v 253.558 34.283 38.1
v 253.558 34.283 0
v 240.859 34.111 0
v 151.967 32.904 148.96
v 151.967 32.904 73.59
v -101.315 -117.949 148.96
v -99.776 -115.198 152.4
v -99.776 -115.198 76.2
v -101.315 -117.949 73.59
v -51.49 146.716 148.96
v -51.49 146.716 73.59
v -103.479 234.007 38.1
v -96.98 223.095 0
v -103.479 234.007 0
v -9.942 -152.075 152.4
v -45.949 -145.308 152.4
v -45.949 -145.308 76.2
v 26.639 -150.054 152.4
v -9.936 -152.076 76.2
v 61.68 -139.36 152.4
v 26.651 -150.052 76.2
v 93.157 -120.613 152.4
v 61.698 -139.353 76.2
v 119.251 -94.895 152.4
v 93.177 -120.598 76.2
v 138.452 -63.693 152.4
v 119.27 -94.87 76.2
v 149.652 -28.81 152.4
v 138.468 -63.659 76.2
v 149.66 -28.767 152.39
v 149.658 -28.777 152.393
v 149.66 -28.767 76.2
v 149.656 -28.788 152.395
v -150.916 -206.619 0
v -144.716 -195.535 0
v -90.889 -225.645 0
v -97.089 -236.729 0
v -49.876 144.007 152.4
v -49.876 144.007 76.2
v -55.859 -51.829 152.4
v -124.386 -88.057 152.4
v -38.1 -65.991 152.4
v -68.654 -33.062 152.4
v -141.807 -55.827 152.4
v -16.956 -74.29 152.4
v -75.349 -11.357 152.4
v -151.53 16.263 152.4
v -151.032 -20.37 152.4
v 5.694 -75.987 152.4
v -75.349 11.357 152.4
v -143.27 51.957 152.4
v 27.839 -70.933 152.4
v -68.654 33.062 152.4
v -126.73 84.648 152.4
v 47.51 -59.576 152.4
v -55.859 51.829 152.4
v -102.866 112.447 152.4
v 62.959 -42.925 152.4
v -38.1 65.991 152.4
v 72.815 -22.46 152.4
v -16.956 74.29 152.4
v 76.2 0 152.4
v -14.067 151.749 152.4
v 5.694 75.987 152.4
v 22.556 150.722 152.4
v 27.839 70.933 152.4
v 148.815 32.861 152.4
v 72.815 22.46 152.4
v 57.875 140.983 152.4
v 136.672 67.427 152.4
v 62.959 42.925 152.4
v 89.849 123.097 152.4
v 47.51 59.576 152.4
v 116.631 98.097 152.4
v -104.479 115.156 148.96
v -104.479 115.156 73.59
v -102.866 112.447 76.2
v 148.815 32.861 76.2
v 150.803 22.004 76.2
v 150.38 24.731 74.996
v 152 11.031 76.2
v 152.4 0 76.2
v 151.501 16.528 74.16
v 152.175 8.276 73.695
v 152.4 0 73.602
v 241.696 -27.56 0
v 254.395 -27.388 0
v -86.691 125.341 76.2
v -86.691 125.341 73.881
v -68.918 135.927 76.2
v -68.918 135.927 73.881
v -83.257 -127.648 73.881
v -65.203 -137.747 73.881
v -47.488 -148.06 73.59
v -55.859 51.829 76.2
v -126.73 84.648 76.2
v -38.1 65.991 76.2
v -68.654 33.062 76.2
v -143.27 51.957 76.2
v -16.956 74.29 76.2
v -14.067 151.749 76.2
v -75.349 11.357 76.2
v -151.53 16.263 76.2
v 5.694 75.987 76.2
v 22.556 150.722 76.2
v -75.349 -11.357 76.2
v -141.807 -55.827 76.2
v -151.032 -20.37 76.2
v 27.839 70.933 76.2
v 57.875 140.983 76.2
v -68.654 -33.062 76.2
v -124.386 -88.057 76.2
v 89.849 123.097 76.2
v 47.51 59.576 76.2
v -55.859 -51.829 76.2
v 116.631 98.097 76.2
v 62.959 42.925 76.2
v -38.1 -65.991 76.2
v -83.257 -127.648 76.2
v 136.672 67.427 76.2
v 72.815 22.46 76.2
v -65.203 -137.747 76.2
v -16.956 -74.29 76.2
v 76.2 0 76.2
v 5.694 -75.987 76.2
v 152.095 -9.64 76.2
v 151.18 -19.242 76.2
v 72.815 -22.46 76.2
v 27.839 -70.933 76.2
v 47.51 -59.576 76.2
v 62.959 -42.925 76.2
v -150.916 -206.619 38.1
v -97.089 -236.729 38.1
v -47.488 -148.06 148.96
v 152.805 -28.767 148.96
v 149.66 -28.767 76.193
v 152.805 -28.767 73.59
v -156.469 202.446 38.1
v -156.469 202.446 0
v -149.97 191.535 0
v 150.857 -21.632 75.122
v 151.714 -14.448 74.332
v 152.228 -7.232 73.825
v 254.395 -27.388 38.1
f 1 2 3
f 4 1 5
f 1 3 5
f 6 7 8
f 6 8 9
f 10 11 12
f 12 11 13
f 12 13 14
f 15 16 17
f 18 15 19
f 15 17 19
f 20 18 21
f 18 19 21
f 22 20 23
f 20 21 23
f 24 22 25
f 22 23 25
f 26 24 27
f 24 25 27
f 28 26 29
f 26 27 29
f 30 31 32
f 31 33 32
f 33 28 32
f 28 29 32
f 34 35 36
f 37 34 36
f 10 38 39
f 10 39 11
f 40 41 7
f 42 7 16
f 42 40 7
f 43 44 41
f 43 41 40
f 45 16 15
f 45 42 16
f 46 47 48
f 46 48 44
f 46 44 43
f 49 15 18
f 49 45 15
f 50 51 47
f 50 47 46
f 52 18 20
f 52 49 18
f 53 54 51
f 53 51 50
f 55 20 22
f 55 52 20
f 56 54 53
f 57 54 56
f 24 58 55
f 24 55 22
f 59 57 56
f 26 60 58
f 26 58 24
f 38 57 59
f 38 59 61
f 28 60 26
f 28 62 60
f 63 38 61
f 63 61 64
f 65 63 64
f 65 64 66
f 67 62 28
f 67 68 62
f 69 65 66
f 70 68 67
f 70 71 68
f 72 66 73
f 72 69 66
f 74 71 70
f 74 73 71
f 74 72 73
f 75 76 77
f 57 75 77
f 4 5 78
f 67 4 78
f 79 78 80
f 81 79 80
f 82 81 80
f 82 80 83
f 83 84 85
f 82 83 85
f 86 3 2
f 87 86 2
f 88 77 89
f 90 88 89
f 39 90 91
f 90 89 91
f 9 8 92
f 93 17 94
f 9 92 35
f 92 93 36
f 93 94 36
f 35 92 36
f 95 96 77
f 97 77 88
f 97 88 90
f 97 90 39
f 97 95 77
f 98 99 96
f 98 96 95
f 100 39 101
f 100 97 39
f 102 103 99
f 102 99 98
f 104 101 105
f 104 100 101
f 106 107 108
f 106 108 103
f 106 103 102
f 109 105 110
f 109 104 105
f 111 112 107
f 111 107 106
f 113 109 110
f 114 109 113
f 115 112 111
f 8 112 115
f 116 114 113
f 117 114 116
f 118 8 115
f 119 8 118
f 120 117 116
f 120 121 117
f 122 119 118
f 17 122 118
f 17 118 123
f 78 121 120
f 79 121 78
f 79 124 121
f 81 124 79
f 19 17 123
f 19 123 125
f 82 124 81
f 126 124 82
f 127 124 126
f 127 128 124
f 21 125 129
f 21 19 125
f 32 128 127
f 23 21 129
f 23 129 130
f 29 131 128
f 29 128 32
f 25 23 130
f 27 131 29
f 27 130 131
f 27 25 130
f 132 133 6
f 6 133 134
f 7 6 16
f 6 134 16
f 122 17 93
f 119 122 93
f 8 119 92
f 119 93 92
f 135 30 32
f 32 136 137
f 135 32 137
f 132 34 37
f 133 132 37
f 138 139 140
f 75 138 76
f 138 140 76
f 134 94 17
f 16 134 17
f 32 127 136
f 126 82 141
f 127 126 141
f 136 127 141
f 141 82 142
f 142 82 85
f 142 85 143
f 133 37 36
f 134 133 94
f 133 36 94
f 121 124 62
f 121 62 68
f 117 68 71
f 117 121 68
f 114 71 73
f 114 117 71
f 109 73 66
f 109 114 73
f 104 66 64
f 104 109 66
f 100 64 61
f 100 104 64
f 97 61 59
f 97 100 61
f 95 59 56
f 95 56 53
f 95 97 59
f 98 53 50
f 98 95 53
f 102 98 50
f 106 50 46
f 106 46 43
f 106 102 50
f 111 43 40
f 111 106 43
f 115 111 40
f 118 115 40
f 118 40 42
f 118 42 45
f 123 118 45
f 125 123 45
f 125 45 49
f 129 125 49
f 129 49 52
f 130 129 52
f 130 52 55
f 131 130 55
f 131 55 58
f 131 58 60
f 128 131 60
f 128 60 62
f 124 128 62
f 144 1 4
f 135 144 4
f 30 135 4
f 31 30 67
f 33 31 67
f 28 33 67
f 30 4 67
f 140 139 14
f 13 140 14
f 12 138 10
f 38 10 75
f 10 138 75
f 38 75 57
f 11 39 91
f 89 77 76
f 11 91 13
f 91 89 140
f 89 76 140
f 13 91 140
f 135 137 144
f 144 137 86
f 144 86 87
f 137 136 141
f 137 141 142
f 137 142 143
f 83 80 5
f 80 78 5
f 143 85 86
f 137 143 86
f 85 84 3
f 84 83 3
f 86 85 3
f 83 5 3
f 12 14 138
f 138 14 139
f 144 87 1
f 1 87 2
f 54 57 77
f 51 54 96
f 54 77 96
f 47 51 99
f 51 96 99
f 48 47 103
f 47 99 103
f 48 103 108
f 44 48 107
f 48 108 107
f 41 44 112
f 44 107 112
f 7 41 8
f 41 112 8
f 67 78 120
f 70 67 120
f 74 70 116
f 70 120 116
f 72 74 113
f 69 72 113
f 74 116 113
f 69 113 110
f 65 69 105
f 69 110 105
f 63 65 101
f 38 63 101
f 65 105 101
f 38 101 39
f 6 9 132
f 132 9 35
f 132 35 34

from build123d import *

# Parameters (mm, degrees)
F0_R     = 76.2
F1_DEPTH = 152.4
F2_R     = 76.2
F3_DEPTH = 76.2
F5_DEPTH = 76.2
F7_DEPTH = 76.2
F9_DEPTH = 76.2


with BuildPart() as f1:
    # F0 (on Top) → F1 (new body)
    with BuildSketch(Plane.XY):
        with BuildLine():
            ThreePointArc((-102.8660584411, 112.447027621), (-77.9844038606, 130.9358344935), (-49.8762557284, 144.0073578485))
            Line((-49.8762557284, 144.0073578485), (-51.4895025042, 146.7159996073))
            Line((-51.4895025042, 146.7159996073), (-103.4791050779, 234.0065559363))
            Line((-103.4791050779, 234.0065559363), (-156.4689077906, 202.4462257088))
            Line((-156.4689077906, 202.4462257088), (-104.4793052169, 115.1556693797))
            Line((-104.4793052169, 115.1556693797), (-102.8660584411, 112.447027621))
        make_face()
        with BuildLine():
            ThreePointArc((149.6603896108, -28.7667826068), (151.7135514328, -14.4484709107), (152.4, 0))
            ThreePointArc((152.4, 0), (151.5011019534, 16.5280400202), (148.8150117204, 32.8611059867))
            ThreePointArc((148.8150117204, 32.8611059867), (74.4015570068, 133.004392089), (-49.8762557284, 144.0073578485))
            ThreePointArc((-49.8762557284, 144.0073578485), (-77.9844038606, 130.9358344935), (-102.8660584411, 112.447027621))
            ThreePointArc((-102.8660584411, 112.447027621), (-152.3859608674, -2.0685575955), (-99.7759023645, -115.1977834307))
            ThreePointArc((-99.7759023645, -115.1977834307), (-74.4015570068, -133.004392089), (-45.9489532793, -145.3081336077))
            ThreePointArc((-45.9489532793, -145.3081336077), (78.0031225642, -130.9246839608), (149.6603896108, -28.7667826068))
        make_face()
        Circle(F0_R, mode=Mode.SUBTRACT)
        with BuildLine():
            Line((-47.4880824642, -148.0595671774), (-45.9489532793, -145.3081336077))
            ThreePointArc((-45.9489532793, -145.3081336077), (-74.4015570068, -133.004392089), (-99.7759023645, -115.1977834307))
            Line((-99.7759023645, -115.1977834307), (-101.3150315494, -117.9492170005))
            Line((-101.3150315494, -117.9492170005), (-150.916069554, -206.6188117265))
            Line((-150.916069554, -206.6188117265), (-97.0891204688, -236.7291619034))
            Line((-97.0891204688, -236.7291619034), (-47.4880824642, -148.0595671774))
        make_face()
        with BuildLine():
            ThreePointArc((148.8150117204, 32.8611059867), (151.5011019534, 16.5280400202), (152.4, 0))
            ThreePointArc((152.4, 0), (151.7135514328, -14.4484709107), (149.6603896108, -28.7667826068))
            Line((149.6603896108, -28.7667826068), (152.8045340537, -28.7667826068))
            Line((152.8045340537, -28.7667826068), (254.3951746319, -27.3877442098))
            Line((254.3951746319, -27.3877442098), (253.5580282594, 34.2829361947))
            Line((253.5580282594, 34.2829361947), (151.9673876811, 32.9038977977))
            Line((151.9673876811, 32.9038977977), (148.8150117204, 32.8611059867))
        make_face()
    extrude(amount=F1_DEPTH)

    # F2 (on face) → F3 (cut)
    with BuildSketch(Plane(origin=(0, 0, 0), x_dir=(1, 0, 0), z_dir=(0, 0, -1))):
        with BuildLine():
            ThreePointArc((148.8150117204, -32.8611059867), (151.5011019534, -16.5280400202), (152.4, 0))
            ThreePointArc((152.4, 0), (151.7135514328, 14.4484709107), (149.6603896108, 28.7667826068))
            ThreePointArc((149.6603896108, 28.7667826068), (78.0031225642, 130.9246839608), (-45.9489532793, 145.3081336077))
            ThreePointArc((-45.9489532793, 145.3081336077), (-74.4015570068, 133.004392089), (-99.7759023645, 115.1977834307))
            ThreePointArc((-99.7759023645, 115.1977834307), (-152.3859608674, 2.0685575955), (-102.8660584411, -112.447027621))
            ThreePointArc((-102.8660584411, -112.447027621), (-77.9844038606, -130.9358344935), (-49.8762557284, -144.0073578485))
            ThreePointArc((-49.8762557284, -144.0073578485), (74.4015570068, -133.004392089), (148.8150117204, -32.8611059867))
        make_face()
        Circle(F2_R, mode=Mode.SUBTRACT)
        Circle(F2_R)
    extrude(amount=-F3_DEPTH, mode=Mode.SUBTRACT)

    # F4 (on face) → F5 (cut)
    with BuildSketch(Plane(origin=(-0.4185731863, 30.8353402022, 0), x_dir=(-0.9999078797, -0.0135732126, 0), z_dir=(-0.0135732126, 0.9999078797, 0))):
        Polygon((-254, 38.1), (-149.2473336147, 152.4), (-254, 152.4), align=None)
        Polygon((-149.2473336147, 0), (-149.2473336147, 76.2), (-241.3, 0), align=None)
    extrude(amount=-F5_DEPTH, mode=Mode.SUBTRACT)

    # F6 (on face) → F7 (cut)
    with BuildSketch(Plane(origin=(-26.4949013563, -15.7801651138, 0), x_dir=(0.5117086867, -0.859159019, 0), z_dir=(-0.859159019, -0.5117086867, 0))):
        Polygon((-254, 38.1), (-149.2473336147, 152.4), (-254, 152.4), align=None)
        Polygon((-149.2473336147, 0), (-149.2473336147, 76.2), (-241.3, 0), align=None)
    extrude(amount=-F7_DEPTH, mode=Mode.SUBTRACT)

    # F8 (on face) → F9 (cut)
    with BuildSketch(Plane(origin=(26.9134745426, -15.0551750885, 0), x_dir=(0.488199193, 0.8727322316, 0), z_dir=(0.8727322316, -0.488199193, 0))):
        Polygon((-254, 38.1), (-149.2473336147, 152.4), (-254, 152.4), align=None)
        Polygon((-149.2473336147, 0), (-149.2473336147, 76.2), (-241.3, 0), align=None)
    extrude(amount=-F9_DEPTH, mode=Mode.SUBTRACT)


solid = f1.part
